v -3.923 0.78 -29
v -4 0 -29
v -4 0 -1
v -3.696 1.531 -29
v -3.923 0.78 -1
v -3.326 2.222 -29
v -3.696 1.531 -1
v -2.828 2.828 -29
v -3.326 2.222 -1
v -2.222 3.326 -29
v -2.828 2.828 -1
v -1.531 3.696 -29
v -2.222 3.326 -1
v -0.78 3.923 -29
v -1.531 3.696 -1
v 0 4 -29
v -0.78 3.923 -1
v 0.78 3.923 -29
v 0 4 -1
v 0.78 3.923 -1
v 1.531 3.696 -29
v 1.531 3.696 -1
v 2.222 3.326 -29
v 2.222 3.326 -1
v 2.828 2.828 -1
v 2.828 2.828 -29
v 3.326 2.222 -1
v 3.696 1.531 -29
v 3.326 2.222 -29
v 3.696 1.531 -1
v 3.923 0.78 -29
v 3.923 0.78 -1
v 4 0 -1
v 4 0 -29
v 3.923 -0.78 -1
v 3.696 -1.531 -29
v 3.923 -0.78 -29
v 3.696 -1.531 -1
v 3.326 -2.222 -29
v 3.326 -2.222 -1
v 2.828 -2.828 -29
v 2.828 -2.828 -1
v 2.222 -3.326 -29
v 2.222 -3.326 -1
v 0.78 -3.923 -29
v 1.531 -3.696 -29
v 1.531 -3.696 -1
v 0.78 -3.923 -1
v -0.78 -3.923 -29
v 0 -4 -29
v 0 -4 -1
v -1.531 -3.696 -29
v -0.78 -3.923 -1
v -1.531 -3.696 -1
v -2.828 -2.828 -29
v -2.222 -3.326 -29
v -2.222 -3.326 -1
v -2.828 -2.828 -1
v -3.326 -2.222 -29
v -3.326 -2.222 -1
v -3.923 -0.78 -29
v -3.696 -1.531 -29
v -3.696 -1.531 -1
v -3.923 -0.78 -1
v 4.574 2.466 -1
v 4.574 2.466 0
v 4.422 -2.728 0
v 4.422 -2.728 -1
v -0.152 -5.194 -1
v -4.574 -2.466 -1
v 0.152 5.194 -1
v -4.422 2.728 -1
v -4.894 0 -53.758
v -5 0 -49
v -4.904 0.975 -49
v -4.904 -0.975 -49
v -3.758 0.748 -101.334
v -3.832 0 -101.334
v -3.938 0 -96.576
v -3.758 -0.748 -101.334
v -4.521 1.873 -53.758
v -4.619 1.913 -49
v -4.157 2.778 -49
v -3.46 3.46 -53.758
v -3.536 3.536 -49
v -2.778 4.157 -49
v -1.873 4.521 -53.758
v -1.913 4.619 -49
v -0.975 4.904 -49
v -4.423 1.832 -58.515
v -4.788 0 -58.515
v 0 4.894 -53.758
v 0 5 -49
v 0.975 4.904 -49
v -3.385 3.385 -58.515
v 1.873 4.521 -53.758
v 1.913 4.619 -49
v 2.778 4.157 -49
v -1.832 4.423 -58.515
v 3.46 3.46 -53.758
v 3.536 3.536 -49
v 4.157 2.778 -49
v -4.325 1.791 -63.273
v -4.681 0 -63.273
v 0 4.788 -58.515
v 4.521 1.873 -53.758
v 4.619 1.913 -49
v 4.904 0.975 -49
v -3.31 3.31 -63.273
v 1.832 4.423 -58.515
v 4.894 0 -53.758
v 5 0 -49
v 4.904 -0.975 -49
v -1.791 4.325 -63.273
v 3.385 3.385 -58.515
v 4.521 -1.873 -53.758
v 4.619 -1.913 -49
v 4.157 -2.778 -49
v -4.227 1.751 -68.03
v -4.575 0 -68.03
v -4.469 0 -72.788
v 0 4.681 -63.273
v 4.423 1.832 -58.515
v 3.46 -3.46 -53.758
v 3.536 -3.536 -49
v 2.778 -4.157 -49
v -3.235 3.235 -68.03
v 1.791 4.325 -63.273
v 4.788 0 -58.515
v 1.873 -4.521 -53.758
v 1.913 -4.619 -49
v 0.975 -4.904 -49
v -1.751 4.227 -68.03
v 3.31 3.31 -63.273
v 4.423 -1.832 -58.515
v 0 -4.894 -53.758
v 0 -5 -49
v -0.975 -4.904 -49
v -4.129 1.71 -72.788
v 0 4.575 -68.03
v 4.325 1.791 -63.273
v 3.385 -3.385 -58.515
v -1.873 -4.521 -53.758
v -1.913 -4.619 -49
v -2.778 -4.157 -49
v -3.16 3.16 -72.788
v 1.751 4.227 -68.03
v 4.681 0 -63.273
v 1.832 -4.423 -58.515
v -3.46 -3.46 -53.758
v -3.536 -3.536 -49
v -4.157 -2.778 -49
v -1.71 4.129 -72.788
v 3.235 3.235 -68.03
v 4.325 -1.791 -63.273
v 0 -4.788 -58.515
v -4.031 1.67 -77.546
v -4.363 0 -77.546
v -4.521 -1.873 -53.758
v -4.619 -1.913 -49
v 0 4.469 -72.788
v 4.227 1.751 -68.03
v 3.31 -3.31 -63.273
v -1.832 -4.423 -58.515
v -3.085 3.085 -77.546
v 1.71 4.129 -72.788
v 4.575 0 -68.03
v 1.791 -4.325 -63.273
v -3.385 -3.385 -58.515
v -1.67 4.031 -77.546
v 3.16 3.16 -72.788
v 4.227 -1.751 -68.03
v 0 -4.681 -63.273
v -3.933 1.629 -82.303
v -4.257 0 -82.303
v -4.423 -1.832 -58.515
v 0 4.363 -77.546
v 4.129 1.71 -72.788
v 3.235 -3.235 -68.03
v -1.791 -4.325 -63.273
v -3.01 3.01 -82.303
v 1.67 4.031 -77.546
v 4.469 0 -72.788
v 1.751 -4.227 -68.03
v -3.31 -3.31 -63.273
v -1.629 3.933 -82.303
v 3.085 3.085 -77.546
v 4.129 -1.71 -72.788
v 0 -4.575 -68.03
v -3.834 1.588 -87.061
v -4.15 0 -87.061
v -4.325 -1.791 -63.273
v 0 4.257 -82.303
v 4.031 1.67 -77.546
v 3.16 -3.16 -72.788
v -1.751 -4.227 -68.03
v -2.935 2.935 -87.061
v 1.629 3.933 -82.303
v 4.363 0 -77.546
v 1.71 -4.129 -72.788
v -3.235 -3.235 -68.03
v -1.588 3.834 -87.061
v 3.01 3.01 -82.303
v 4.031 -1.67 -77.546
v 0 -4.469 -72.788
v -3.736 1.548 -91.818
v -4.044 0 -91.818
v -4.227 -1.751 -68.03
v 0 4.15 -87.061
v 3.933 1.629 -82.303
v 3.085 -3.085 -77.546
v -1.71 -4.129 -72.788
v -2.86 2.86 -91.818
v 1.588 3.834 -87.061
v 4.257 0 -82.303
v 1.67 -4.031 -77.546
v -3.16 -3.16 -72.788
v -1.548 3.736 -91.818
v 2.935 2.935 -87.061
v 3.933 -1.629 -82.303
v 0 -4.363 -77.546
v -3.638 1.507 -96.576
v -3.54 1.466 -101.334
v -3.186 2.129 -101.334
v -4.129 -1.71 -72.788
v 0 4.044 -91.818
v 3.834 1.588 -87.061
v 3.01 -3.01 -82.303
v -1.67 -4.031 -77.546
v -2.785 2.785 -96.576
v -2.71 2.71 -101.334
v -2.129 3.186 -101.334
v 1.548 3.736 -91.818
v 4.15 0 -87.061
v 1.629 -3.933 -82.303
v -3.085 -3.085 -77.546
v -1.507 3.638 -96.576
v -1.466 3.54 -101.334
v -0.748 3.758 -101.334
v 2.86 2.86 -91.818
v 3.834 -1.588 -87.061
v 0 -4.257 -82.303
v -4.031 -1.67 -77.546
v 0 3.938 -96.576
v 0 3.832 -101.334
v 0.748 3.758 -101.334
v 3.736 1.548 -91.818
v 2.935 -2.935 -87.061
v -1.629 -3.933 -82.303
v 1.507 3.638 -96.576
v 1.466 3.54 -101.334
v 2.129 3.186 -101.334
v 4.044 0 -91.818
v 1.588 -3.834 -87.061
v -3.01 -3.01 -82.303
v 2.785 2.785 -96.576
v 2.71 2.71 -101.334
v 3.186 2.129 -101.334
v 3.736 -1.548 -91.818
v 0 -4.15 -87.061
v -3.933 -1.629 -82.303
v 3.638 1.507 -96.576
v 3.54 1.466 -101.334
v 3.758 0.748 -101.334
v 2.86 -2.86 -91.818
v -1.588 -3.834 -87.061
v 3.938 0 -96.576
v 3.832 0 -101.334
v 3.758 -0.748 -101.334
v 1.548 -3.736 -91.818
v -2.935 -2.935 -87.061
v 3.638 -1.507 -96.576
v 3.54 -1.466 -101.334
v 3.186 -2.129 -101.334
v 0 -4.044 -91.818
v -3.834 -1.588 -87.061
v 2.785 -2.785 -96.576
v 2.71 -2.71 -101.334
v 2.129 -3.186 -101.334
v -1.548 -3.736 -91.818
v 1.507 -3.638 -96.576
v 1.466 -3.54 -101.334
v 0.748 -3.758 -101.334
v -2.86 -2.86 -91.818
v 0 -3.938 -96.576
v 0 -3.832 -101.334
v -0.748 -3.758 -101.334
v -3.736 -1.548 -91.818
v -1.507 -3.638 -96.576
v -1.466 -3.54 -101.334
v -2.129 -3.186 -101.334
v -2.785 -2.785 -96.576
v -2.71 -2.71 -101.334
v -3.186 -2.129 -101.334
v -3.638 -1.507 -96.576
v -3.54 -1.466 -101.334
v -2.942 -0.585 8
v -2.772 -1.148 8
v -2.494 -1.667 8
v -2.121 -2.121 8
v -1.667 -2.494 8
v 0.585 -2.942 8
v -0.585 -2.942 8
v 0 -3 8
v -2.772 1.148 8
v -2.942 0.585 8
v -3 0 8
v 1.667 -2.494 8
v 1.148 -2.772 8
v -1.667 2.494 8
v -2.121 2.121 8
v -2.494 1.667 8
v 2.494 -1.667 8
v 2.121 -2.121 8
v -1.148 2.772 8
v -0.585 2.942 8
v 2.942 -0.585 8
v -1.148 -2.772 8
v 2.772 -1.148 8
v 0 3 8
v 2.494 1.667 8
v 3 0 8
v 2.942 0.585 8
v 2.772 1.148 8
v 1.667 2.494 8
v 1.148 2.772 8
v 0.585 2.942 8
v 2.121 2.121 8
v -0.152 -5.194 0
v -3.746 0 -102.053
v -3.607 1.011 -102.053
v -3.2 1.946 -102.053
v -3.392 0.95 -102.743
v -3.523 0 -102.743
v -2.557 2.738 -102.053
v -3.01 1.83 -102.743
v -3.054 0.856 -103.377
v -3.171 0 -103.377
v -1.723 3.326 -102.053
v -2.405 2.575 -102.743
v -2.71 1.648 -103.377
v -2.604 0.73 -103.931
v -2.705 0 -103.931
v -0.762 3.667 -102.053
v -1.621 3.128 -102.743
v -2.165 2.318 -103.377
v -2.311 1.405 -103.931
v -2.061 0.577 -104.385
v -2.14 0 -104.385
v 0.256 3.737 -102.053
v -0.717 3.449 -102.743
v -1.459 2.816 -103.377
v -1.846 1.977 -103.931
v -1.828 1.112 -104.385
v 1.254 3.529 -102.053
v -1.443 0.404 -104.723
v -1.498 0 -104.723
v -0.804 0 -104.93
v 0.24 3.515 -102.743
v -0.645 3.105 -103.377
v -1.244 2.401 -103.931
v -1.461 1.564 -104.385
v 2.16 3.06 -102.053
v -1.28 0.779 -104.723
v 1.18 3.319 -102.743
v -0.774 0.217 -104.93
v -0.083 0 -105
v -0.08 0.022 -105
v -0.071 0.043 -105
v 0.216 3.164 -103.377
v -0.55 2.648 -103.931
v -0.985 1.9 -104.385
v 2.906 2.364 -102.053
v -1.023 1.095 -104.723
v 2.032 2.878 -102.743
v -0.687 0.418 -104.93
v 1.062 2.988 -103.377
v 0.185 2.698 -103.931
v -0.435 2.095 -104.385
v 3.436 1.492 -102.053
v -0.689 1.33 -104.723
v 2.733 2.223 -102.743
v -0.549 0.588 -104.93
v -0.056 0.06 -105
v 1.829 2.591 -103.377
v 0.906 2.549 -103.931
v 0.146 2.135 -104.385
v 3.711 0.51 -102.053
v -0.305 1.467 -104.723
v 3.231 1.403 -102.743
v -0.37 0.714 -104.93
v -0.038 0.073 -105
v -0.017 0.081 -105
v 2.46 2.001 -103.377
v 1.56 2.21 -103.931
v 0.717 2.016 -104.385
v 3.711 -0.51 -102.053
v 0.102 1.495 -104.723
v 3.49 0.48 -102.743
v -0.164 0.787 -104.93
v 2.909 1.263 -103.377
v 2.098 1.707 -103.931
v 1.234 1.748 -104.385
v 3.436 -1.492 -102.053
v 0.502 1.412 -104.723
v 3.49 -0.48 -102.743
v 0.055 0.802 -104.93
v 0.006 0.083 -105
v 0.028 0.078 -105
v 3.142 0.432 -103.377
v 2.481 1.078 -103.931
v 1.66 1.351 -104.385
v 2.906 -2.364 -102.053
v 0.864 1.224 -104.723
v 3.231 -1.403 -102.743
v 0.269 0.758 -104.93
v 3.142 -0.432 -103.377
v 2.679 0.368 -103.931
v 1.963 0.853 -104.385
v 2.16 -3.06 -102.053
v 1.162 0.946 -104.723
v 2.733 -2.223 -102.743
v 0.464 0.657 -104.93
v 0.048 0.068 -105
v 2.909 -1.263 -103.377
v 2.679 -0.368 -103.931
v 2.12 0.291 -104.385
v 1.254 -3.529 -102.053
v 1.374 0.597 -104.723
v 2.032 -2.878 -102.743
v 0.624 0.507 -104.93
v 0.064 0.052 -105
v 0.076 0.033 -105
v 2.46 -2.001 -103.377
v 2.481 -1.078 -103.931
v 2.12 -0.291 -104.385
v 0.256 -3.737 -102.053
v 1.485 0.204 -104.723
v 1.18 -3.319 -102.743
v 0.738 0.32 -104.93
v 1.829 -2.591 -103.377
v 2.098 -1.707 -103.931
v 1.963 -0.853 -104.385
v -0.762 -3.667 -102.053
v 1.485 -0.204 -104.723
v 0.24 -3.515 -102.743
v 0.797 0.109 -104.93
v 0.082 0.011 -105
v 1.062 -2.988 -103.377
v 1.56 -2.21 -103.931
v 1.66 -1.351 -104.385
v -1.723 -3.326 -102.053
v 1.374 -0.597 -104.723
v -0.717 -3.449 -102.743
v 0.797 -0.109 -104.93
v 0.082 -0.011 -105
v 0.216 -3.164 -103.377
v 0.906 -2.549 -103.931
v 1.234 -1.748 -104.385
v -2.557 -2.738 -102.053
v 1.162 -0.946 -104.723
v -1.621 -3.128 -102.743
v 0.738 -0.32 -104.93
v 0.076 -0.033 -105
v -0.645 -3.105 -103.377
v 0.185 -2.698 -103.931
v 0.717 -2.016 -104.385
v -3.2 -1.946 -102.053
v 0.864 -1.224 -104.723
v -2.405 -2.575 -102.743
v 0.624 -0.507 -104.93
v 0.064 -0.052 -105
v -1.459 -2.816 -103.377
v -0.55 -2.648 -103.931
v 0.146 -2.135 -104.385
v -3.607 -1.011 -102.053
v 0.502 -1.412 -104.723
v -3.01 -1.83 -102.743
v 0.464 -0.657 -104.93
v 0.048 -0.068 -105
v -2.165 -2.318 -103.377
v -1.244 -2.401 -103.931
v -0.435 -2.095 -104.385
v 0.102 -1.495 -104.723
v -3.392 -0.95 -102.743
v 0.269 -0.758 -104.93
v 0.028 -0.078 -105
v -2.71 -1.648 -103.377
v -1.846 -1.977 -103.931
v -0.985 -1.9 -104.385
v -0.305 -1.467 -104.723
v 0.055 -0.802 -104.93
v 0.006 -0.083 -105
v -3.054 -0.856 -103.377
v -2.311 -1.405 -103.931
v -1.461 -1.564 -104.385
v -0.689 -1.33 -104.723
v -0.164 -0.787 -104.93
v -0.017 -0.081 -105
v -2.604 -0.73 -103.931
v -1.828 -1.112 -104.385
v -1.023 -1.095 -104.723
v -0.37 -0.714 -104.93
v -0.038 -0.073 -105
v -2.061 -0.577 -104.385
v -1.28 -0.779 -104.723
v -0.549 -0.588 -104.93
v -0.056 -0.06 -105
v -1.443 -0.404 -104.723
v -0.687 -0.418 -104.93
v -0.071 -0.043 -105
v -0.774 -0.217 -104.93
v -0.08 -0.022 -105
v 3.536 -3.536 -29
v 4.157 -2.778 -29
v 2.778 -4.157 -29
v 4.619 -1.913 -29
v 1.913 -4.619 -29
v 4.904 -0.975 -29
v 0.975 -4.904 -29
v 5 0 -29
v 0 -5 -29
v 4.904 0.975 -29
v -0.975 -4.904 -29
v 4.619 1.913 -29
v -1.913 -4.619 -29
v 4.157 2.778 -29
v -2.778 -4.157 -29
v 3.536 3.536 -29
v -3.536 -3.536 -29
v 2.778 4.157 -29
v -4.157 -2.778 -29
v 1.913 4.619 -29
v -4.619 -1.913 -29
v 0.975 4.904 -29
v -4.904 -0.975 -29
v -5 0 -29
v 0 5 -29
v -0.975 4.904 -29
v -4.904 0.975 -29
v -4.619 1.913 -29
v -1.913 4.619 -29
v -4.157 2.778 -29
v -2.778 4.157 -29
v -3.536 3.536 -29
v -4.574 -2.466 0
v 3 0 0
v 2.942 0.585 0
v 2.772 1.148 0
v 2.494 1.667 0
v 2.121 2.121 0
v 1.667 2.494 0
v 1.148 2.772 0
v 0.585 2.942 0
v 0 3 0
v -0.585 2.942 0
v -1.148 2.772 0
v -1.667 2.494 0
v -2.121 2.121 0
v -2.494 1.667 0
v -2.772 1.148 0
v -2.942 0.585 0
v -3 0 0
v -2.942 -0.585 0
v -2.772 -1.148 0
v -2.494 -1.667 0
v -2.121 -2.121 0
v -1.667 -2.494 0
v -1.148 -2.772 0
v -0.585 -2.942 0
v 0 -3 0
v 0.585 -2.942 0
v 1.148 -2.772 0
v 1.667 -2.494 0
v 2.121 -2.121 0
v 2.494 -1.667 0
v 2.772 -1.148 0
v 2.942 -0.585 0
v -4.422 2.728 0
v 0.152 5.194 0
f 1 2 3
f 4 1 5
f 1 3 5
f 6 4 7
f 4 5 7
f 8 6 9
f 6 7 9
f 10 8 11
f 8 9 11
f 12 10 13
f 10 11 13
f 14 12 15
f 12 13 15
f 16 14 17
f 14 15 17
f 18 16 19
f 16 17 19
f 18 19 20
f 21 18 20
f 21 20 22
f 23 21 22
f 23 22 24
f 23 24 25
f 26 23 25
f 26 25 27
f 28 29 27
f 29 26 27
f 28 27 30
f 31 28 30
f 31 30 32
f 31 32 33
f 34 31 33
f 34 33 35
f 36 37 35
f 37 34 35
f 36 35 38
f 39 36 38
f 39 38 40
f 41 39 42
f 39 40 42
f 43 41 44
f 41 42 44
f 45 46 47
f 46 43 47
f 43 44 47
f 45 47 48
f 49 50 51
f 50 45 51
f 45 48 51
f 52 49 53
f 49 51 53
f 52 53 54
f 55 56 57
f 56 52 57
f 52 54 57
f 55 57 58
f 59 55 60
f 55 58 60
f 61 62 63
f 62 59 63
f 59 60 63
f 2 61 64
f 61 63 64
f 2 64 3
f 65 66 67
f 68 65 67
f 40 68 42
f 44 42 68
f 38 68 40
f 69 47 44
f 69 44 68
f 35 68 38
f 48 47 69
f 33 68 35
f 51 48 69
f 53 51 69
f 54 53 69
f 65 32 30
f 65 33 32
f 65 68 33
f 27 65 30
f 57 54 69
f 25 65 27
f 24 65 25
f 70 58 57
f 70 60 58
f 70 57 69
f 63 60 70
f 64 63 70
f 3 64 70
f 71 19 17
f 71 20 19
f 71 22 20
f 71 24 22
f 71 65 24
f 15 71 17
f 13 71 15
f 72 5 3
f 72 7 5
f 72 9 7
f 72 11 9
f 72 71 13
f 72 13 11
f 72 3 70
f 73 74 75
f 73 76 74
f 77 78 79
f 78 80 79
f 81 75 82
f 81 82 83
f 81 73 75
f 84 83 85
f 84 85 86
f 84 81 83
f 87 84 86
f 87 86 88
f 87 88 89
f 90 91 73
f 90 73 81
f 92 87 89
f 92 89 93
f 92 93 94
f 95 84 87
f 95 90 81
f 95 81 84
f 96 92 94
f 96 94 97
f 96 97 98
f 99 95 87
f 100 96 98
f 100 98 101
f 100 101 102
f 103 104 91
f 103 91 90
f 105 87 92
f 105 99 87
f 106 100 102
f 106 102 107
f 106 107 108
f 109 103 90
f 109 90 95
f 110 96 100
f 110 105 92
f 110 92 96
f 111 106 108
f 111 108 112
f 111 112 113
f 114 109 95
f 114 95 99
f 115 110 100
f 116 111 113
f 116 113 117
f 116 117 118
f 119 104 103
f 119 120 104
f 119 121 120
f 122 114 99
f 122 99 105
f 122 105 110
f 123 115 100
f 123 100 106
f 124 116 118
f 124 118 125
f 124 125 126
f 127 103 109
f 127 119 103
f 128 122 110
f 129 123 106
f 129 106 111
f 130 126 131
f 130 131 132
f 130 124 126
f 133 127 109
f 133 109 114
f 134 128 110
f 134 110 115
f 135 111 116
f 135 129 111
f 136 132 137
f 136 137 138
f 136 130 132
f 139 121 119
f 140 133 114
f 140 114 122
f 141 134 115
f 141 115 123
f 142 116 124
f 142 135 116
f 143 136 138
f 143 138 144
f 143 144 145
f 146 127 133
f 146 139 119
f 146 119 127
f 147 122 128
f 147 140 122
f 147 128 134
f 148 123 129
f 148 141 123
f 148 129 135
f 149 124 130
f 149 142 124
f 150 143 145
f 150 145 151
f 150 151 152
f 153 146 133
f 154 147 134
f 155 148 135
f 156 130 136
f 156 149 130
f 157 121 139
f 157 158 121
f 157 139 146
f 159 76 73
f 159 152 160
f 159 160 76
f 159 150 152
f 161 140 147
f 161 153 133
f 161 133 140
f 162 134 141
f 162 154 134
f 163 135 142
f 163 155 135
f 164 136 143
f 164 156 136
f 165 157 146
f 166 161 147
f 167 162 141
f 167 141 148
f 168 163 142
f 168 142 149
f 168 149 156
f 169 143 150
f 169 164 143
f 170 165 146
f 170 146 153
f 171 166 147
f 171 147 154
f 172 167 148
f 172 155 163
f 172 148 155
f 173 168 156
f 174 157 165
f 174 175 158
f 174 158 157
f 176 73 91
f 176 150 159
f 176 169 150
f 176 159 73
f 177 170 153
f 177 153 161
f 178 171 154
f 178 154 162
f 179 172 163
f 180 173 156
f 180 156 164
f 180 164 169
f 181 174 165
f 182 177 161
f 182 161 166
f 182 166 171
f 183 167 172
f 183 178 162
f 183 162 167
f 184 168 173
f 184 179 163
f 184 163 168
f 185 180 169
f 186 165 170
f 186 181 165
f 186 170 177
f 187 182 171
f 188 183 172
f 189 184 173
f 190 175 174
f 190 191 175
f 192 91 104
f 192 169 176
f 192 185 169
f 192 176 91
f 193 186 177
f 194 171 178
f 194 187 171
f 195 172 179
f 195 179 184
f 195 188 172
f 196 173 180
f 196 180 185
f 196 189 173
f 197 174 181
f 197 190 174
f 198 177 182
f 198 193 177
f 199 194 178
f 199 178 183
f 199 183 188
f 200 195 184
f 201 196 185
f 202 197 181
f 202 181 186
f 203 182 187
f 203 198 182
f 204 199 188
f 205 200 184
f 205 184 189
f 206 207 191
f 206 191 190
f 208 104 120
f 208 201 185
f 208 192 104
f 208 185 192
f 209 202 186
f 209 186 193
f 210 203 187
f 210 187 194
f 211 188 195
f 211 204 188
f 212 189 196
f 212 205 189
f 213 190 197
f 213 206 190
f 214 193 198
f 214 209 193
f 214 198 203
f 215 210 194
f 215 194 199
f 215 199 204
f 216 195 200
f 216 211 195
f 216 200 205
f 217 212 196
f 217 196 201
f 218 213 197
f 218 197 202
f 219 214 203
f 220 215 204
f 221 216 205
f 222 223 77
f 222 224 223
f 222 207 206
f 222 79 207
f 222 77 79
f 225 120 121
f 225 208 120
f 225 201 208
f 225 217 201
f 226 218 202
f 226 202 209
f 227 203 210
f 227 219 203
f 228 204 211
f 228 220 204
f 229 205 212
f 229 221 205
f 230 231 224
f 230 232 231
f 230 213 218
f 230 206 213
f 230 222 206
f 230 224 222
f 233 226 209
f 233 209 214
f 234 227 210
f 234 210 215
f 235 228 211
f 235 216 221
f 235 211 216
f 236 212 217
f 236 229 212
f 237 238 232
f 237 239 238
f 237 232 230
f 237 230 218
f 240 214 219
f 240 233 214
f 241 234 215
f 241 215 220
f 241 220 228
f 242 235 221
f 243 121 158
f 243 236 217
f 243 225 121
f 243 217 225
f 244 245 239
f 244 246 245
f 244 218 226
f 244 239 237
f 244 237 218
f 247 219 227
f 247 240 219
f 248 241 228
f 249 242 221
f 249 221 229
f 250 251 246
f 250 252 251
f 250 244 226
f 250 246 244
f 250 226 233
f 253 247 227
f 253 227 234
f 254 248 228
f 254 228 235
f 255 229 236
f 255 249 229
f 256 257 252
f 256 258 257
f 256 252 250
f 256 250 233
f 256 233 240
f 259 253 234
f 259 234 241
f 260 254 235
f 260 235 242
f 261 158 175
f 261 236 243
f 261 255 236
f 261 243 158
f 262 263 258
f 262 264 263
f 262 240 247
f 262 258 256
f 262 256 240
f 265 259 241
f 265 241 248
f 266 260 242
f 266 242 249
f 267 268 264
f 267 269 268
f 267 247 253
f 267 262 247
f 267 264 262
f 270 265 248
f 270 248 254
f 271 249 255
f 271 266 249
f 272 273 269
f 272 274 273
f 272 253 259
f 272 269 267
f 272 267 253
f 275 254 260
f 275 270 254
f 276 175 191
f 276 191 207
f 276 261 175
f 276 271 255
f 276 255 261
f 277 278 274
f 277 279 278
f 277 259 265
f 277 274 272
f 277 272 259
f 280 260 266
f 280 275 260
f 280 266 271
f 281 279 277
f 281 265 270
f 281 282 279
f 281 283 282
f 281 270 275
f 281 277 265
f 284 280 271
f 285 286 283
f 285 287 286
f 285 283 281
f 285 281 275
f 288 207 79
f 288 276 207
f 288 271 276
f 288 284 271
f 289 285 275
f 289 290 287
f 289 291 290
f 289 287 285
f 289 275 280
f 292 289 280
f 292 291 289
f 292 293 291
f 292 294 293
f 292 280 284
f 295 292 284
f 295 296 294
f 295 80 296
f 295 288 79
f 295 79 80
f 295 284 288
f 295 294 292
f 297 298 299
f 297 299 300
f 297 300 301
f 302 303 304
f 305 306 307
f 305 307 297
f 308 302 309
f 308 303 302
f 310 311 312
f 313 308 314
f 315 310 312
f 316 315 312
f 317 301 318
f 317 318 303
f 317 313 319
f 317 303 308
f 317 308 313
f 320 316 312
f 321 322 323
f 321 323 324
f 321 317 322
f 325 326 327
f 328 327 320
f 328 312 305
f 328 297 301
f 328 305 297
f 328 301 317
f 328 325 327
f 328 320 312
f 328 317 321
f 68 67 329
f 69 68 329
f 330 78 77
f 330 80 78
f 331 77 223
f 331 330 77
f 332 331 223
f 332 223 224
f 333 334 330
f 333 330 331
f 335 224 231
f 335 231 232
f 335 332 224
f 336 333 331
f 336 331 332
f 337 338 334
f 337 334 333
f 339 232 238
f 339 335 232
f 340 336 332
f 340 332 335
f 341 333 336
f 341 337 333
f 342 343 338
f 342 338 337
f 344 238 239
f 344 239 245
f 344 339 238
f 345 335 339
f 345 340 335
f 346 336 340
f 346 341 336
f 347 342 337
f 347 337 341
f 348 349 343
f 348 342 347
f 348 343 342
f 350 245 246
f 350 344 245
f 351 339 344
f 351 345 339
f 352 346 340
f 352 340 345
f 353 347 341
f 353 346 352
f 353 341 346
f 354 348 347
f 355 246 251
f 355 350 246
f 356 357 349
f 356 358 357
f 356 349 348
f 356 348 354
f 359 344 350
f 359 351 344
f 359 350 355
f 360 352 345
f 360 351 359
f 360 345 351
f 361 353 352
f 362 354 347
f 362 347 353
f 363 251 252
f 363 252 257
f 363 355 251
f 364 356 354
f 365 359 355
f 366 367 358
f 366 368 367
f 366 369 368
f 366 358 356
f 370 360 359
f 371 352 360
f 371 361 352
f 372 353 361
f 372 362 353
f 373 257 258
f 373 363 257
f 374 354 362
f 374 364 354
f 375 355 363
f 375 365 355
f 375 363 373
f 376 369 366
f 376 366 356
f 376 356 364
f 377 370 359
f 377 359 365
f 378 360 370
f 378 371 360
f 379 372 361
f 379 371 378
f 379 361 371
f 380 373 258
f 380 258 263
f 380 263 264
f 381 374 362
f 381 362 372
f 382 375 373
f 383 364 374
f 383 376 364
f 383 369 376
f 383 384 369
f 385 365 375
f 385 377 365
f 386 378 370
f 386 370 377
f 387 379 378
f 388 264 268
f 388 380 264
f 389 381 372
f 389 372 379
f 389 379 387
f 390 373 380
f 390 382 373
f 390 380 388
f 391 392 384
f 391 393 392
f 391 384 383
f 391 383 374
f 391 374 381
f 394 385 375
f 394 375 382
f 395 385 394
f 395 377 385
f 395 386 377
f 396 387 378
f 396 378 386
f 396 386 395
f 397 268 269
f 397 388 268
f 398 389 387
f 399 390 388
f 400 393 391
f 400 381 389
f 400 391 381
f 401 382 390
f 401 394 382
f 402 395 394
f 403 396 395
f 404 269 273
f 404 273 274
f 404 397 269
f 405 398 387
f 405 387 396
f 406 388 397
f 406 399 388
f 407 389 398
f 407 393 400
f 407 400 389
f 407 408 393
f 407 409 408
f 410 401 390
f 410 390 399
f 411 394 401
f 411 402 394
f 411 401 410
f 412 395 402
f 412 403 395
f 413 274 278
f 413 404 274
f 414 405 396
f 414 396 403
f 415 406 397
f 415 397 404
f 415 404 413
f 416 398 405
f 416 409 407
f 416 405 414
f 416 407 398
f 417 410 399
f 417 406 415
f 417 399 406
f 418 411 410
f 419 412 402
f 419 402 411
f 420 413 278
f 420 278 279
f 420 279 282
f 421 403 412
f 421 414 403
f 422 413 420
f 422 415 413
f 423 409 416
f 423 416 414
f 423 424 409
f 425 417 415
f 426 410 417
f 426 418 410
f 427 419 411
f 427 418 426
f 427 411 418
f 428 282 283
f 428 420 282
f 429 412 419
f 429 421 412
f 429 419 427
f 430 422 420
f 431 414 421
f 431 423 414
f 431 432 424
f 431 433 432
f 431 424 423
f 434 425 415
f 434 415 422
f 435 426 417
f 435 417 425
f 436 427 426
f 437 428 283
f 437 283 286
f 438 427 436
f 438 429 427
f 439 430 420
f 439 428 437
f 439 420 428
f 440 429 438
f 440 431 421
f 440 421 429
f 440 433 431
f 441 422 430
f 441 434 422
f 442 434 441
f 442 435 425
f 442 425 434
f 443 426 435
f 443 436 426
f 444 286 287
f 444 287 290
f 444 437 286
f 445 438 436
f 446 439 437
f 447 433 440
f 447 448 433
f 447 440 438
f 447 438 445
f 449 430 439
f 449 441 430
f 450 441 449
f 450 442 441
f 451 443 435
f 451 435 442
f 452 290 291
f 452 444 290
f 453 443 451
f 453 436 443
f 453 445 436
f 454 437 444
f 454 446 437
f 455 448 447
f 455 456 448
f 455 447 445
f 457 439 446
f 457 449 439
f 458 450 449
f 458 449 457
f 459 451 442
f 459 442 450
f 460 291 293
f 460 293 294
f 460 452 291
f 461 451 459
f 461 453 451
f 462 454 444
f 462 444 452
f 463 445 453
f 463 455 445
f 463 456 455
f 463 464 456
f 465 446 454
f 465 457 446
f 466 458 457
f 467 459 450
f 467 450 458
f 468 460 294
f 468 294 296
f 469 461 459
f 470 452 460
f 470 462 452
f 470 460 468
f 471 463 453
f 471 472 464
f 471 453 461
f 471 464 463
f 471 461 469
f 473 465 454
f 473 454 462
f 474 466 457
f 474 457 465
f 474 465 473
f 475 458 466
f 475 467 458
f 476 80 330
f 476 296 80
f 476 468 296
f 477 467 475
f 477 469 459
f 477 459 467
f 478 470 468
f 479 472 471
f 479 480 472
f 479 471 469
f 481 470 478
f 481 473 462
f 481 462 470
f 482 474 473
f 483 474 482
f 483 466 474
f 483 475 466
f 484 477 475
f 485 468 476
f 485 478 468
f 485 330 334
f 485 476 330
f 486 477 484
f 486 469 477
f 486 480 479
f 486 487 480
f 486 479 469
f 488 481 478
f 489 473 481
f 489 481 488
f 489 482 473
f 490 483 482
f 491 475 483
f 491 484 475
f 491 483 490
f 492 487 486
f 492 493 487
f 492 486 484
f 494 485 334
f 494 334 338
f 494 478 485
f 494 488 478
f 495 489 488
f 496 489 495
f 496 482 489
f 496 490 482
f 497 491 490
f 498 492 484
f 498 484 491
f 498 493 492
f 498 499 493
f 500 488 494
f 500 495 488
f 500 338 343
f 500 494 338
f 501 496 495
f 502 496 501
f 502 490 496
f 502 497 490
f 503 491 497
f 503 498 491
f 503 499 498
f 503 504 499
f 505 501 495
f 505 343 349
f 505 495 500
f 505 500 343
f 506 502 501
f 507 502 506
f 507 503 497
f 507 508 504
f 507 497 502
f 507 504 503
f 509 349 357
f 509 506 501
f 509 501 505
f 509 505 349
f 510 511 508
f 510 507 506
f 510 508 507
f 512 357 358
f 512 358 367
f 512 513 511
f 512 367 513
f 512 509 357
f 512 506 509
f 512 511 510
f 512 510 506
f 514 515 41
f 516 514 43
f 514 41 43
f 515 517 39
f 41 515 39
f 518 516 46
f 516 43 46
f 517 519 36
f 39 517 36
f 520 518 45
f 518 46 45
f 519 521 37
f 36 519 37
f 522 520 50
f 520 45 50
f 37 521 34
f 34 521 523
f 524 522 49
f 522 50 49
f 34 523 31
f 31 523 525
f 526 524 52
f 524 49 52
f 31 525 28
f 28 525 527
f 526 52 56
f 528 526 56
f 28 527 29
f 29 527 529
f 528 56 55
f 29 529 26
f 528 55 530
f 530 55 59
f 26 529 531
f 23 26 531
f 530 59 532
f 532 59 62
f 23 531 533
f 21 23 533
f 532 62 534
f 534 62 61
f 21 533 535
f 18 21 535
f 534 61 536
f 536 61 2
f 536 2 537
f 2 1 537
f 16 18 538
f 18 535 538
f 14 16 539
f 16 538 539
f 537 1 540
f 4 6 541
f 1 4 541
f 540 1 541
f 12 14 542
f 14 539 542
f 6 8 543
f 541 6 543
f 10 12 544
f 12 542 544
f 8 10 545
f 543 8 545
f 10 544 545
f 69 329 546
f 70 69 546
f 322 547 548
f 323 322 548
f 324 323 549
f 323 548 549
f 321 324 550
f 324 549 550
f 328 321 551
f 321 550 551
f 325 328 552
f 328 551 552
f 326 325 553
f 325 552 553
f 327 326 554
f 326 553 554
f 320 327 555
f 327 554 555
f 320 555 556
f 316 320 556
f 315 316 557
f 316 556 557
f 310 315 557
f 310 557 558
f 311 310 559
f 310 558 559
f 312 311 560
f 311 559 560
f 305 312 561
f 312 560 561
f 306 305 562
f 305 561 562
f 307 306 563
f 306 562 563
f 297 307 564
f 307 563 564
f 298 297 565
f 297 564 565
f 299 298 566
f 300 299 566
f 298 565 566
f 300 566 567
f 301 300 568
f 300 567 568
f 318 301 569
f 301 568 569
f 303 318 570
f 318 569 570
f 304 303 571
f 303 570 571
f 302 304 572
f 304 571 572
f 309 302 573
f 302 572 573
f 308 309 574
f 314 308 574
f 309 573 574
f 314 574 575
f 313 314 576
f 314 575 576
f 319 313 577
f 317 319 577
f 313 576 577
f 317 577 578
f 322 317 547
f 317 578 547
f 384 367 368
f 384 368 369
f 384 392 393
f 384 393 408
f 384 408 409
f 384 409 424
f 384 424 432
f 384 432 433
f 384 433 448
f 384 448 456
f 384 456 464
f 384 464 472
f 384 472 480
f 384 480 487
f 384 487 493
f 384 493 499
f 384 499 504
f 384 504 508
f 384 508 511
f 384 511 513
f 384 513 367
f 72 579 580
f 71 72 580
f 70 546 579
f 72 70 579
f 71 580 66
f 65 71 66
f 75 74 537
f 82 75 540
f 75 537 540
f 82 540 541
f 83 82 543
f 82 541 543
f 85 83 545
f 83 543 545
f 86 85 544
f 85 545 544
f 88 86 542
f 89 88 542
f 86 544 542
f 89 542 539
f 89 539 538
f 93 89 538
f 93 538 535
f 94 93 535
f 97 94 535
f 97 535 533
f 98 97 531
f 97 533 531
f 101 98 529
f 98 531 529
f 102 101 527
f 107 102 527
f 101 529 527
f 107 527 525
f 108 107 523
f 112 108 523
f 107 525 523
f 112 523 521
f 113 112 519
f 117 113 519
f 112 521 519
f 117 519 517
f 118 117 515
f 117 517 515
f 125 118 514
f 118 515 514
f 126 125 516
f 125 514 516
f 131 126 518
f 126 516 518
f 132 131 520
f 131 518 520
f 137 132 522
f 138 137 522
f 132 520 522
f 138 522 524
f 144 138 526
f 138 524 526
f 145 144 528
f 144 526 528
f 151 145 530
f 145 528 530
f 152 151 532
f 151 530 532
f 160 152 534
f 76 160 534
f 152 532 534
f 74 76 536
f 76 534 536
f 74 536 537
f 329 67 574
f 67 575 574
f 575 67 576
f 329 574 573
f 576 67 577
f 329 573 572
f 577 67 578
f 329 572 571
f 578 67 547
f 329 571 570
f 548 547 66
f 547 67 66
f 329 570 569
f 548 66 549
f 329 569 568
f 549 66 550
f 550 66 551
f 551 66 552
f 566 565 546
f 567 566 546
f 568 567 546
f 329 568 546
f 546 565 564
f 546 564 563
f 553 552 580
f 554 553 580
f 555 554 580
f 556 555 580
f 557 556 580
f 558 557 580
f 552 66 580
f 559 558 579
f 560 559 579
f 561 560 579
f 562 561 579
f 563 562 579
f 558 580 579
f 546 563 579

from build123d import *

# Parameters (mm, degrees)
CROQUIS1_R              = 3
SALIENTE_EXTRUIR1_DEPTH = 8
SALIENTE_EXTRUIR2_DEPTH = 1
CROQUIS3_R              = 4
SALIENTE_EXTRUIR3_DEPTH = 33
SALIENTE_EXTRUIR5_START = -5
CROQUIS6_R              = 5
SALIENTE_EXTRUIR5_DEPTH = 20
CROQUIS7_R              = 3.75
REDONDEO3_R             = 3.75


with BuildPart() as part:
    # Croquis1 → Saliente-Extruir1 (new body)
    with BuildSketch(Plane.XY):
        Circle(CROQUIS1_R)
    extrude(amount=SALIENTE_EXTRUIR1_DEPTH)

    # Croquis2 → Saliente-Extruir2 (add)
    with BuildSketch(Plane(origin=(0, 0, 0), x_dir=(-1, 0, 0), z_dir=(0, 0, -1))):
        Polygon((4.42226819, 2.728285919), (-0.151630819, 5.193939554), (-4.573899009, 2.465653636), (-4.42226819, -2.728285919), (0.151630819, -5.193939554), (4.573899009, -2.465653636), align=None)
    extrude(amount=SALIENTE_EXTRUIR2_DEPTH)

    # Croquis3 → Saliente-Extruir3 (add)
    with BuildSketch(Plane(origin=(0, 0, -1), x_dir=(-1, 0, 0), z_dir=(0, 0, -1))):
        Circle(CROQUIS3_R)
    extrude(amount=SALIENTE_EXTRUIR3_DEPTH)

    # Croquis6 → Saliente-Extruir5 (add)
    with BuildSketch(Plane(origin=(0, 0, -34), x_dir=(-1, 0, 0), z_dir=(0, 0, -1)).offset(SALIENTE_EXTRUIR5_START)):
        Circle(CROQUIS6_R)
    extrude(amount=SALIENTE_EXTRUIR5_DEPTH)

    # Croquis7 → section 1 of recubrir2
    with BuildSketch(Plane(origin=(0, 0, -105), x_dir=(-1, 0, 0), z_dir=(0, 0, -1)), mode=Mode.PRIVATE) as recubrir2_s1:
        Circle(CROQUIS7_R)
    # loft up to a face of the part (recubrir2)
    loft([Face(Wire([part.edges().sort_by_distance((3.42273553, 3.644843137, -49))[0]])), recubrir2_s1.sketch])

    # Redondeo3
    redondeo3_edges = [part.edges().sort_by_distance(p)[0] for p in [
        (3.75, 0, -105),
    ]]
    fillet(redondeo3_edges, radius=REDONDEO3_R)


solid = part.part
